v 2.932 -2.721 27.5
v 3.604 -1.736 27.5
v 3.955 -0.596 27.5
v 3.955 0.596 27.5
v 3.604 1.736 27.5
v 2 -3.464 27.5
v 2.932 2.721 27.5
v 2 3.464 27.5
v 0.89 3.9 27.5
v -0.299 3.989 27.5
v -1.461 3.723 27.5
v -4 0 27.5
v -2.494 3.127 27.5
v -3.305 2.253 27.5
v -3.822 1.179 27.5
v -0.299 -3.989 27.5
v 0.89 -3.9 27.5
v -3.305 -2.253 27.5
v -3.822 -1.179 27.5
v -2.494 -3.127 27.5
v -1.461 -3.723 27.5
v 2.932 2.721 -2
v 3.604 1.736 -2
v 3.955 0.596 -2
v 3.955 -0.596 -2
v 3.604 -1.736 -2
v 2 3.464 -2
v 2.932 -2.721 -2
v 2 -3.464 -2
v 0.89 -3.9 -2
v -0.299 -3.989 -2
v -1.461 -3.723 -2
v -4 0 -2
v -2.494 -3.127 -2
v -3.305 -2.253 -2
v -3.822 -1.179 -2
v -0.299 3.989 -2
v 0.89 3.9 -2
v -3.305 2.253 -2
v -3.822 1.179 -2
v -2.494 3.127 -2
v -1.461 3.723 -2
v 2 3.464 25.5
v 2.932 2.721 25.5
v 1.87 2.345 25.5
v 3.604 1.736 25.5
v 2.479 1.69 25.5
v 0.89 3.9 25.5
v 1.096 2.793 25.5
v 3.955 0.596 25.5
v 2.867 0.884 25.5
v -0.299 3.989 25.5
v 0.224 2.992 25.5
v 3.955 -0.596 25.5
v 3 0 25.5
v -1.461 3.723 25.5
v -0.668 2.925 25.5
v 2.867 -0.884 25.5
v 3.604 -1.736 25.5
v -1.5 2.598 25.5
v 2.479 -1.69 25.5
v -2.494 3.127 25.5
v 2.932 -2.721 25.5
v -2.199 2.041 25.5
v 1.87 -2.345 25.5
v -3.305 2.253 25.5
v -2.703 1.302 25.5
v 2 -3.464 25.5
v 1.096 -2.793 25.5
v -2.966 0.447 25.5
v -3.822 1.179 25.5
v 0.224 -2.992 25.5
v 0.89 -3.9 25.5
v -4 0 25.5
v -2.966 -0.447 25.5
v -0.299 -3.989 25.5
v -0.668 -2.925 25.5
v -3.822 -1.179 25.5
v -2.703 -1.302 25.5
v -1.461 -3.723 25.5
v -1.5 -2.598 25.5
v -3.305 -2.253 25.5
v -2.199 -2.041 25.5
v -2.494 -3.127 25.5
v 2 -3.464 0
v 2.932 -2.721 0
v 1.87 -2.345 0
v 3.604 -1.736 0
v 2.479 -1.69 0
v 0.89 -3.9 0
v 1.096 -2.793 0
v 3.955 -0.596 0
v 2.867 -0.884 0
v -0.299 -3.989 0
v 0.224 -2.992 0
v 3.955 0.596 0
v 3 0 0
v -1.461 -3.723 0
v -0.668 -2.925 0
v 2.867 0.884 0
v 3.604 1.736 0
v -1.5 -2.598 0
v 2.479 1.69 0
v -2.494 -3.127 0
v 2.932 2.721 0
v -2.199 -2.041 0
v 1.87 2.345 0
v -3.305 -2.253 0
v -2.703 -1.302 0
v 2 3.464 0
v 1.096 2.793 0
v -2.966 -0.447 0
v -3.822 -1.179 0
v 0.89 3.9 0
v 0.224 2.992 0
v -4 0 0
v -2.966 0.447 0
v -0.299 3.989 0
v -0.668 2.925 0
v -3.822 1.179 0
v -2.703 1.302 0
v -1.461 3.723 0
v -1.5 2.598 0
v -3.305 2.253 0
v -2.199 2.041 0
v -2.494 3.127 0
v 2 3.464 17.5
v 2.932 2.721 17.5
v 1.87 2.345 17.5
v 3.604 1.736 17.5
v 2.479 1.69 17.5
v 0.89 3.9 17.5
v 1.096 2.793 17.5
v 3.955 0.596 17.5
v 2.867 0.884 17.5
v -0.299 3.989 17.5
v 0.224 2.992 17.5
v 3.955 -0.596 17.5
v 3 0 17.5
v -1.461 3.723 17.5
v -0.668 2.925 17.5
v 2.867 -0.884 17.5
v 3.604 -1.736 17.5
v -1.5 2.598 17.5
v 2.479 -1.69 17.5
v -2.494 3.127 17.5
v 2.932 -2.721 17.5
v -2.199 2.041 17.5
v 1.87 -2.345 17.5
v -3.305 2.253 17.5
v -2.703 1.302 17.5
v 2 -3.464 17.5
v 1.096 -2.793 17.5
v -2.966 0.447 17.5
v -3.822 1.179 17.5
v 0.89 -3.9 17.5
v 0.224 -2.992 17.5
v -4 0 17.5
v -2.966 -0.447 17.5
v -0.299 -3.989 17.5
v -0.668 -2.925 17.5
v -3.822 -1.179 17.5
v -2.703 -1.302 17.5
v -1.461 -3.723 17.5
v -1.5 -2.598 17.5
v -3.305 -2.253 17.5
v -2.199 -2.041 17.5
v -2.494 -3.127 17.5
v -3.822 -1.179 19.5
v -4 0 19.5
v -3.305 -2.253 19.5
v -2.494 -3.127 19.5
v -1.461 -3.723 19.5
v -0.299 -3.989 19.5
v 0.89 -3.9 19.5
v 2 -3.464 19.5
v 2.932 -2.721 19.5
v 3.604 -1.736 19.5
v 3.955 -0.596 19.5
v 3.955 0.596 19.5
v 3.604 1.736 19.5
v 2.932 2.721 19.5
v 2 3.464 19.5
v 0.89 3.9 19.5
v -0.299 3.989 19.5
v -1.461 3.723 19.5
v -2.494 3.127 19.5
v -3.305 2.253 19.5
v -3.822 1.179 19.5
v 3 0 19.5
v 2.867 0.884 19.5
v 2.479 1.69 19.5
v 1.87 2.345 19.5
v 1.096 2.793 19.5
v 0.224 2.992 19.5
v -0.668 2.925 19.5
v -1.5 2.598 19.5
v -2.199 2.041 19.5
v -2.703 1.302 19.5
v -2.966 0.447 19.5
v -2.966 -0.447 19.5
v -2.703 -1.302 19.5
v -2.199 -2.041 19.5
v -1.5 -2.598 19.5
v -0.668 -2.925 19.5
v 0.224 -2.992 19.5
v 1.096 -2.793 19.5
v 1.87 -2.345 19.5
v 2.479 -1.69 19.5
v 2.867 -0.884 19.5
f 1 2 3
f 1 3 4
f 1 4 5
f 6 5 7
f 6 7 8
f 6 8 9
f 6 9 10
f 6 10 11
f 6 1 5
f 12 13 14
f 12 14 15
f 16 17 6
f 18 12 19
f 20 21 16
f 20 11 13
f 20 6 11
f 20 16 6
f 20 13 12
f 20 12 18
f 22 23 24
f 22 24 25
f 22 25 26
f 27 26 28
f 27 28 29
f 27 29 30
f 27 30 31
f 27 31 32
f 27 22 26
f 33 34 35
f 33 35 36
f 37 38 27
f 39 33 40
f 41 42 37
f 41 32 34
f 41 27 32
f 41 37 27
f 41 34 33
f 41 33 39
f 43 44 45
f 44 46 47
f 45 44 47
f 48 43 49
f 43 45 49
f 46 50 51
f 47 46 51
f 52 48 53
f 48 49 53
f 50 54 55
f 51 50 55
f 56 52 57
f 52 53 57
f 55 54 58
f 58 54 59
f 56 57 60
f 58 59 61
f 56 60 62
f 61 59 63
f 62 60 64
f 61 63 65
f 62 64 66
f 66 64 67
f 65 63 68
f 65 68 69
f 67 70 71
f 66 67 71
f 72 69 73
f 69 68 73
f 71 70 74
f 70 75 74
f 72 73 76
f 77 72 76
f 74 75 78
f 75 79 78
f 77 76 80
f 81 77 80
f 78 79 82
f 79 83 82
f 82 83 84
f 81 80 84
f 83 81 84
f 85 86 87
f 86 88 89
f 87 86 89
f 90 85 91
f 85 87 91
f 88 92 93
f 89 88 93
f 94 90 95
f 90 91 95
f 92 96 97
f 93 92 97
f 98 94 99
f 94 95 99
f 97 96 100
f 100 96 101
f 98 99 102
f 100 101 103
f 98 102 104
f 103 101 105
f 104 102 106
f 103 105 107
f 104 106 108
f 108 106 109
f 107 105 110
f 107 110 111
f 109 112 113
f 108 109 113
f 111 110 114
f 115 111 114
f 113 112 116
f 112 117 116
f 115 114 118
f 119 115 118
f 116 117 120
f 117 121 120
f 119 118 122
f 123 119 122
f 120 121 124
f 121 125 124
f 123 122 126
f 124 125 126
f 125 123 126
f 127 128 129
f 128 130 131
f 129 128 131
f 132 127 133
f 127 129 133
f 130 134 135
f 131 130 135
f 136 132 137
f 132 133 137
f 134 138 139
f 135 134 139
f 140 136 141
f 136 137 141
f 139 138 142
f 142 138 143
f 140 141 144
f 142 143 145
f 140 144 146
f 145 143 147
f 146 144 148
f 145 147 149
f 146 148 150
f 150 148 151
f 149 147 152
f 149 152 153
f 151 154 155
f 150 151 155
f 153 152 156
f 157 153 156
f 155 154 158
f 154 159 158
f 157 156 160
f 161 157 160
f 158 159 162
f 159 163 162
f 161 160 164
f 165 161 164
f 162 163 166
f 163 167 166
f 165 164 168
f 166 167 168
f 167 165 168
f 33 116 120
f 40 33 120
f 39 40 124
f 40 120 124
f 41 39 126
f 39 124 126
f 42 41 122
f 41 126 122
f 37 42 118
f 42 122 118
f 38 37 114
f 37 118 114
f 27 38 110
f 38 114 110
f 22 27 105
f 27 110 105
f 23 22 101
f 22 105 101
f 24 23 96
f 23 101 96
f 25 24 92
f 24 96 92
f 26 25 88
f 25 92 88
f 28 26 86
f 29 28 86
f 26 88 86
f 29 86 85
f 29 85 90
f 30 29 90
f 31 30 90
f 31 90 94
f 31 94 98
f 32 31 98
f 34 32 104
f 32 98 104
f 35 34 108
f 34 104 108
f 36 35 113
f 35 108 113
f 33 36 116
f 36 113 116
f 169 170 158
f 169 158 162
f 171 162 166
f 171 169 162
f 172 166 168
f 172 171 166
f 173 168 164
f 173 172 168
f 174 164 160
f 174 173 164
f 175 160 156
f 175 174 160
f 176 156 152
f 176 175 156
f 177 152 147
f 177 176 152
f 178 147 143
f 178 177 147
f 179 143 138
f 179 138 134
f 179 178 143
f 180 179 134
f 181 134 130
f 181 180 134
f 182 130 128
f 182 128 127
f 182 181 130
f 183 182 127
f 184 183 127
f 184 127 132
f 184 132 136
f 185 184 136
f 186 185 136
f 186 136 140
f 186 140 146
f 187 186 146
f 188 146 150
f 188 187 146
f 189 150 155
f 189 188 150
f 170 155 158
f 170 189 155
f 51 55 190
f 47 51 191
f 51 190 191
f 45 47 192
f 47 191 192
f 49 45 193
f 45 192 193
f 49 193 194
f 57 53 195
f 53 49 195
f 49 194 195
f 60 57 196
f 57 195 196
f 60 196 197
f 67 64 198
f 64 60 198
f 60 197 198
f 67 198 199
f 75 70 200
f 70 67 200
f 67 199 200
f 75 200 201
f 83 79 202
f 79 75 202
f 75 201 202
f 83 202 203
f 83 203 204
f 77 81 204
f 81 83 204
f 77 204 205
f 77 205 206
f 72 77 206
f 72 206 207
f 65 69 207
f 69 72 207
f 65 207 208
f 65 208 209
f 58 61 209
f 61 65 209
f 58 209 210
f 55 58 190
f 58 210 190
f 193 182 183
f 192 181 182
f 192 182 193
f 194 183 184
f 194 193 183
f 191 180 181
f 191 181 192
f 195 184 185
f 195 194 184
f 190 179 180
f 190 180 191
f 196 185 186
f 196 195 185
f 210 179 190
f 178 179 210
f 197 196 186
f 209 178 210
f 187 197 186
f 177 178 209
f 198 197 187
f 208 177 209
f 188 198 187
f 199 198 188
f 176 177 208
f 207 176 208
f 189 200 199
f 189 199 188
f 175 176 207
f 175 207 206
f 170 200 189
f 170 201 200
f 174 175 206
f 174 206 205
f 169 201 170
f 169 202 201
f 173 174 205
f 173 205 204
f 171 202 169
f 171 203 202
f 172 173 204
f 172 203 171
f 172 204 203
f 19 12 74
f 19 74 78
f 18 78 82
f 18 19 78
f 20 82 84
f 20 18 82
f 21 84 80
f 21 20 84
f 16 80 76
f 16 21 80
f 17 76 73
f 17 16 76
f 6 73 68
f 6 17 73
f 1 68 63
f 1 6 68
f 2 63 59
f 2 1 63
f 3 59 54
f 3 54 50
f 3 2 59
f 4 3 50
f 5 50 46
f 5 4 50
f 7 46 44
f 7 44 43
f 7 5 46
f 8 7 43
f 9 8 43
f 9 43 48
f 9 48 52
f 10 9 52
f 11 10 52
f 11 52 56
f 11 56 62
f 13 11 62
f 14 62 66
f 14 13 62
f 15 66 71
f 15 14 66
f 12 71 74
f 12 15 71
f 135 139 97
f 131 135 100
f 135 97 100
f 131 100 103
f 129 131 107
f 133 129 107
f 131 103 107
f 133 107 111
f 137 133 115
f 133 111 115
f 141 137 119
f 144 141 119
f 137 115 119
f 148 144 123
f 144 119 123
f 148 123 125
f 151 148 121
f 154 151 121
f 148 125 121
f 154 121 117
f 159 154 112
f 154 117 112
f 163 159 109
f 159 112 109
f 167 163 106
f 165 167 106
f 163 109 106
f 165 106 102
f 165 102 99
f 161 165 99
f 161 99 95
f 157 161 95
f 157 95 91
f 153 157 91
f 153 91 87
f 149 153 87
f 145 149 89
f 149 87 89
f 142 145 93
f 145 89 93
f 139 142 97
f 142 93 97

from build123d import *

# Parameters (mm, degrees)
SKETCH_1_R          = 3
EXTRUDE_1_DEPTH     = 17.5
SKETCH_2_R          = 4
EXTRUDE_2_DEPTH     = 2
EXTRUDE_START       = 2
SKETCH_3_R          = 4
EXTRUDE_3_DEPTH     = 2
SKETCH_4_R          = 3
EXTRUDE_4_DEPTH     = 20
SKETCH_5_R          = 4
EXTRUDE_5_DEPTH     = 2
SKETCH_7_R          = 4
CUT_EXTRUDE_1_DEPTH = 16
SKETCH_8_R          = 4
EXTRUDE_6_DEPTH     = 2


with BuildPart() as part:
    # 草图1 → 凸台-拉伸1 (new body)
    with BuildSketch(Plane.XY):
        Circle(SKETCH_1_R)
    extrude(amount=EXTRUDE_1_DEPTH)

    # 草图2 → 凸台-拉伸2 (add)
    with BuildSketch(Plane(origin=(0, 0, 0), x_dir=(-1, 0, 0), z_dir=(0, 0, -1))):
        Circle(SKETCH_2_R)
    extrude(amount=EXTRUDE_2_DEPTH)

    # 草图3 → 凸台-拉伸3 (add)
    with BuildSketch(Plane.XY.offset(17.5).offset(EXTRUDE_START)):
        with Locations(Location((0, 0, 0), (0, 0, 180))):
            Circle(SKETCH_3_R)
    extrude(amount=-EXTRUDE_3_DEPTH)

    # 草图4 → 凸台-拉伸4 (add)
    with BuildSketch(Plane.XY.offset(19.5)):
        Circle(SKETCH_4_R)
    extrude(amount=EXTRUDE_4_DEPTH)

    # 草图5 → 凸台-拉伸5 (add)
    with BuildSketch(Plane.XY.offset(39.5).offset(EXTRUDE_START)):
        with Locations(Location((0, 0, 0), (0, 0, 180))):
            Circle(SKETCH_5_R)
    extrude(amount=-EXTRUDE_5_DEPTH)

    # 草图7 → 切除-拉伸1 (cut)
    with BuildSketch(Plane.XY.offset(41.5)):
        with Locations(Location((0, 0, 0), (0, 0, 180))):
            Circle(SKETCH_7_R)
    extrude(amount=-CUT_EXTRUDE_1_DEPTH, mode=Mode.SUBTRACT)

    # 草图8 → 凸台-拉伸6 (add)
    with BuildSketch(Plane.XY.offset(25.5).offset(EXTRUDE_START)):
        with Locations(Location((0, 0, 0), (0, 0, 180))):
            Circle(SKETCH_8_R)
    extrude(amount=-EXTRUDE_6_DEPTH)


solid = part.part
